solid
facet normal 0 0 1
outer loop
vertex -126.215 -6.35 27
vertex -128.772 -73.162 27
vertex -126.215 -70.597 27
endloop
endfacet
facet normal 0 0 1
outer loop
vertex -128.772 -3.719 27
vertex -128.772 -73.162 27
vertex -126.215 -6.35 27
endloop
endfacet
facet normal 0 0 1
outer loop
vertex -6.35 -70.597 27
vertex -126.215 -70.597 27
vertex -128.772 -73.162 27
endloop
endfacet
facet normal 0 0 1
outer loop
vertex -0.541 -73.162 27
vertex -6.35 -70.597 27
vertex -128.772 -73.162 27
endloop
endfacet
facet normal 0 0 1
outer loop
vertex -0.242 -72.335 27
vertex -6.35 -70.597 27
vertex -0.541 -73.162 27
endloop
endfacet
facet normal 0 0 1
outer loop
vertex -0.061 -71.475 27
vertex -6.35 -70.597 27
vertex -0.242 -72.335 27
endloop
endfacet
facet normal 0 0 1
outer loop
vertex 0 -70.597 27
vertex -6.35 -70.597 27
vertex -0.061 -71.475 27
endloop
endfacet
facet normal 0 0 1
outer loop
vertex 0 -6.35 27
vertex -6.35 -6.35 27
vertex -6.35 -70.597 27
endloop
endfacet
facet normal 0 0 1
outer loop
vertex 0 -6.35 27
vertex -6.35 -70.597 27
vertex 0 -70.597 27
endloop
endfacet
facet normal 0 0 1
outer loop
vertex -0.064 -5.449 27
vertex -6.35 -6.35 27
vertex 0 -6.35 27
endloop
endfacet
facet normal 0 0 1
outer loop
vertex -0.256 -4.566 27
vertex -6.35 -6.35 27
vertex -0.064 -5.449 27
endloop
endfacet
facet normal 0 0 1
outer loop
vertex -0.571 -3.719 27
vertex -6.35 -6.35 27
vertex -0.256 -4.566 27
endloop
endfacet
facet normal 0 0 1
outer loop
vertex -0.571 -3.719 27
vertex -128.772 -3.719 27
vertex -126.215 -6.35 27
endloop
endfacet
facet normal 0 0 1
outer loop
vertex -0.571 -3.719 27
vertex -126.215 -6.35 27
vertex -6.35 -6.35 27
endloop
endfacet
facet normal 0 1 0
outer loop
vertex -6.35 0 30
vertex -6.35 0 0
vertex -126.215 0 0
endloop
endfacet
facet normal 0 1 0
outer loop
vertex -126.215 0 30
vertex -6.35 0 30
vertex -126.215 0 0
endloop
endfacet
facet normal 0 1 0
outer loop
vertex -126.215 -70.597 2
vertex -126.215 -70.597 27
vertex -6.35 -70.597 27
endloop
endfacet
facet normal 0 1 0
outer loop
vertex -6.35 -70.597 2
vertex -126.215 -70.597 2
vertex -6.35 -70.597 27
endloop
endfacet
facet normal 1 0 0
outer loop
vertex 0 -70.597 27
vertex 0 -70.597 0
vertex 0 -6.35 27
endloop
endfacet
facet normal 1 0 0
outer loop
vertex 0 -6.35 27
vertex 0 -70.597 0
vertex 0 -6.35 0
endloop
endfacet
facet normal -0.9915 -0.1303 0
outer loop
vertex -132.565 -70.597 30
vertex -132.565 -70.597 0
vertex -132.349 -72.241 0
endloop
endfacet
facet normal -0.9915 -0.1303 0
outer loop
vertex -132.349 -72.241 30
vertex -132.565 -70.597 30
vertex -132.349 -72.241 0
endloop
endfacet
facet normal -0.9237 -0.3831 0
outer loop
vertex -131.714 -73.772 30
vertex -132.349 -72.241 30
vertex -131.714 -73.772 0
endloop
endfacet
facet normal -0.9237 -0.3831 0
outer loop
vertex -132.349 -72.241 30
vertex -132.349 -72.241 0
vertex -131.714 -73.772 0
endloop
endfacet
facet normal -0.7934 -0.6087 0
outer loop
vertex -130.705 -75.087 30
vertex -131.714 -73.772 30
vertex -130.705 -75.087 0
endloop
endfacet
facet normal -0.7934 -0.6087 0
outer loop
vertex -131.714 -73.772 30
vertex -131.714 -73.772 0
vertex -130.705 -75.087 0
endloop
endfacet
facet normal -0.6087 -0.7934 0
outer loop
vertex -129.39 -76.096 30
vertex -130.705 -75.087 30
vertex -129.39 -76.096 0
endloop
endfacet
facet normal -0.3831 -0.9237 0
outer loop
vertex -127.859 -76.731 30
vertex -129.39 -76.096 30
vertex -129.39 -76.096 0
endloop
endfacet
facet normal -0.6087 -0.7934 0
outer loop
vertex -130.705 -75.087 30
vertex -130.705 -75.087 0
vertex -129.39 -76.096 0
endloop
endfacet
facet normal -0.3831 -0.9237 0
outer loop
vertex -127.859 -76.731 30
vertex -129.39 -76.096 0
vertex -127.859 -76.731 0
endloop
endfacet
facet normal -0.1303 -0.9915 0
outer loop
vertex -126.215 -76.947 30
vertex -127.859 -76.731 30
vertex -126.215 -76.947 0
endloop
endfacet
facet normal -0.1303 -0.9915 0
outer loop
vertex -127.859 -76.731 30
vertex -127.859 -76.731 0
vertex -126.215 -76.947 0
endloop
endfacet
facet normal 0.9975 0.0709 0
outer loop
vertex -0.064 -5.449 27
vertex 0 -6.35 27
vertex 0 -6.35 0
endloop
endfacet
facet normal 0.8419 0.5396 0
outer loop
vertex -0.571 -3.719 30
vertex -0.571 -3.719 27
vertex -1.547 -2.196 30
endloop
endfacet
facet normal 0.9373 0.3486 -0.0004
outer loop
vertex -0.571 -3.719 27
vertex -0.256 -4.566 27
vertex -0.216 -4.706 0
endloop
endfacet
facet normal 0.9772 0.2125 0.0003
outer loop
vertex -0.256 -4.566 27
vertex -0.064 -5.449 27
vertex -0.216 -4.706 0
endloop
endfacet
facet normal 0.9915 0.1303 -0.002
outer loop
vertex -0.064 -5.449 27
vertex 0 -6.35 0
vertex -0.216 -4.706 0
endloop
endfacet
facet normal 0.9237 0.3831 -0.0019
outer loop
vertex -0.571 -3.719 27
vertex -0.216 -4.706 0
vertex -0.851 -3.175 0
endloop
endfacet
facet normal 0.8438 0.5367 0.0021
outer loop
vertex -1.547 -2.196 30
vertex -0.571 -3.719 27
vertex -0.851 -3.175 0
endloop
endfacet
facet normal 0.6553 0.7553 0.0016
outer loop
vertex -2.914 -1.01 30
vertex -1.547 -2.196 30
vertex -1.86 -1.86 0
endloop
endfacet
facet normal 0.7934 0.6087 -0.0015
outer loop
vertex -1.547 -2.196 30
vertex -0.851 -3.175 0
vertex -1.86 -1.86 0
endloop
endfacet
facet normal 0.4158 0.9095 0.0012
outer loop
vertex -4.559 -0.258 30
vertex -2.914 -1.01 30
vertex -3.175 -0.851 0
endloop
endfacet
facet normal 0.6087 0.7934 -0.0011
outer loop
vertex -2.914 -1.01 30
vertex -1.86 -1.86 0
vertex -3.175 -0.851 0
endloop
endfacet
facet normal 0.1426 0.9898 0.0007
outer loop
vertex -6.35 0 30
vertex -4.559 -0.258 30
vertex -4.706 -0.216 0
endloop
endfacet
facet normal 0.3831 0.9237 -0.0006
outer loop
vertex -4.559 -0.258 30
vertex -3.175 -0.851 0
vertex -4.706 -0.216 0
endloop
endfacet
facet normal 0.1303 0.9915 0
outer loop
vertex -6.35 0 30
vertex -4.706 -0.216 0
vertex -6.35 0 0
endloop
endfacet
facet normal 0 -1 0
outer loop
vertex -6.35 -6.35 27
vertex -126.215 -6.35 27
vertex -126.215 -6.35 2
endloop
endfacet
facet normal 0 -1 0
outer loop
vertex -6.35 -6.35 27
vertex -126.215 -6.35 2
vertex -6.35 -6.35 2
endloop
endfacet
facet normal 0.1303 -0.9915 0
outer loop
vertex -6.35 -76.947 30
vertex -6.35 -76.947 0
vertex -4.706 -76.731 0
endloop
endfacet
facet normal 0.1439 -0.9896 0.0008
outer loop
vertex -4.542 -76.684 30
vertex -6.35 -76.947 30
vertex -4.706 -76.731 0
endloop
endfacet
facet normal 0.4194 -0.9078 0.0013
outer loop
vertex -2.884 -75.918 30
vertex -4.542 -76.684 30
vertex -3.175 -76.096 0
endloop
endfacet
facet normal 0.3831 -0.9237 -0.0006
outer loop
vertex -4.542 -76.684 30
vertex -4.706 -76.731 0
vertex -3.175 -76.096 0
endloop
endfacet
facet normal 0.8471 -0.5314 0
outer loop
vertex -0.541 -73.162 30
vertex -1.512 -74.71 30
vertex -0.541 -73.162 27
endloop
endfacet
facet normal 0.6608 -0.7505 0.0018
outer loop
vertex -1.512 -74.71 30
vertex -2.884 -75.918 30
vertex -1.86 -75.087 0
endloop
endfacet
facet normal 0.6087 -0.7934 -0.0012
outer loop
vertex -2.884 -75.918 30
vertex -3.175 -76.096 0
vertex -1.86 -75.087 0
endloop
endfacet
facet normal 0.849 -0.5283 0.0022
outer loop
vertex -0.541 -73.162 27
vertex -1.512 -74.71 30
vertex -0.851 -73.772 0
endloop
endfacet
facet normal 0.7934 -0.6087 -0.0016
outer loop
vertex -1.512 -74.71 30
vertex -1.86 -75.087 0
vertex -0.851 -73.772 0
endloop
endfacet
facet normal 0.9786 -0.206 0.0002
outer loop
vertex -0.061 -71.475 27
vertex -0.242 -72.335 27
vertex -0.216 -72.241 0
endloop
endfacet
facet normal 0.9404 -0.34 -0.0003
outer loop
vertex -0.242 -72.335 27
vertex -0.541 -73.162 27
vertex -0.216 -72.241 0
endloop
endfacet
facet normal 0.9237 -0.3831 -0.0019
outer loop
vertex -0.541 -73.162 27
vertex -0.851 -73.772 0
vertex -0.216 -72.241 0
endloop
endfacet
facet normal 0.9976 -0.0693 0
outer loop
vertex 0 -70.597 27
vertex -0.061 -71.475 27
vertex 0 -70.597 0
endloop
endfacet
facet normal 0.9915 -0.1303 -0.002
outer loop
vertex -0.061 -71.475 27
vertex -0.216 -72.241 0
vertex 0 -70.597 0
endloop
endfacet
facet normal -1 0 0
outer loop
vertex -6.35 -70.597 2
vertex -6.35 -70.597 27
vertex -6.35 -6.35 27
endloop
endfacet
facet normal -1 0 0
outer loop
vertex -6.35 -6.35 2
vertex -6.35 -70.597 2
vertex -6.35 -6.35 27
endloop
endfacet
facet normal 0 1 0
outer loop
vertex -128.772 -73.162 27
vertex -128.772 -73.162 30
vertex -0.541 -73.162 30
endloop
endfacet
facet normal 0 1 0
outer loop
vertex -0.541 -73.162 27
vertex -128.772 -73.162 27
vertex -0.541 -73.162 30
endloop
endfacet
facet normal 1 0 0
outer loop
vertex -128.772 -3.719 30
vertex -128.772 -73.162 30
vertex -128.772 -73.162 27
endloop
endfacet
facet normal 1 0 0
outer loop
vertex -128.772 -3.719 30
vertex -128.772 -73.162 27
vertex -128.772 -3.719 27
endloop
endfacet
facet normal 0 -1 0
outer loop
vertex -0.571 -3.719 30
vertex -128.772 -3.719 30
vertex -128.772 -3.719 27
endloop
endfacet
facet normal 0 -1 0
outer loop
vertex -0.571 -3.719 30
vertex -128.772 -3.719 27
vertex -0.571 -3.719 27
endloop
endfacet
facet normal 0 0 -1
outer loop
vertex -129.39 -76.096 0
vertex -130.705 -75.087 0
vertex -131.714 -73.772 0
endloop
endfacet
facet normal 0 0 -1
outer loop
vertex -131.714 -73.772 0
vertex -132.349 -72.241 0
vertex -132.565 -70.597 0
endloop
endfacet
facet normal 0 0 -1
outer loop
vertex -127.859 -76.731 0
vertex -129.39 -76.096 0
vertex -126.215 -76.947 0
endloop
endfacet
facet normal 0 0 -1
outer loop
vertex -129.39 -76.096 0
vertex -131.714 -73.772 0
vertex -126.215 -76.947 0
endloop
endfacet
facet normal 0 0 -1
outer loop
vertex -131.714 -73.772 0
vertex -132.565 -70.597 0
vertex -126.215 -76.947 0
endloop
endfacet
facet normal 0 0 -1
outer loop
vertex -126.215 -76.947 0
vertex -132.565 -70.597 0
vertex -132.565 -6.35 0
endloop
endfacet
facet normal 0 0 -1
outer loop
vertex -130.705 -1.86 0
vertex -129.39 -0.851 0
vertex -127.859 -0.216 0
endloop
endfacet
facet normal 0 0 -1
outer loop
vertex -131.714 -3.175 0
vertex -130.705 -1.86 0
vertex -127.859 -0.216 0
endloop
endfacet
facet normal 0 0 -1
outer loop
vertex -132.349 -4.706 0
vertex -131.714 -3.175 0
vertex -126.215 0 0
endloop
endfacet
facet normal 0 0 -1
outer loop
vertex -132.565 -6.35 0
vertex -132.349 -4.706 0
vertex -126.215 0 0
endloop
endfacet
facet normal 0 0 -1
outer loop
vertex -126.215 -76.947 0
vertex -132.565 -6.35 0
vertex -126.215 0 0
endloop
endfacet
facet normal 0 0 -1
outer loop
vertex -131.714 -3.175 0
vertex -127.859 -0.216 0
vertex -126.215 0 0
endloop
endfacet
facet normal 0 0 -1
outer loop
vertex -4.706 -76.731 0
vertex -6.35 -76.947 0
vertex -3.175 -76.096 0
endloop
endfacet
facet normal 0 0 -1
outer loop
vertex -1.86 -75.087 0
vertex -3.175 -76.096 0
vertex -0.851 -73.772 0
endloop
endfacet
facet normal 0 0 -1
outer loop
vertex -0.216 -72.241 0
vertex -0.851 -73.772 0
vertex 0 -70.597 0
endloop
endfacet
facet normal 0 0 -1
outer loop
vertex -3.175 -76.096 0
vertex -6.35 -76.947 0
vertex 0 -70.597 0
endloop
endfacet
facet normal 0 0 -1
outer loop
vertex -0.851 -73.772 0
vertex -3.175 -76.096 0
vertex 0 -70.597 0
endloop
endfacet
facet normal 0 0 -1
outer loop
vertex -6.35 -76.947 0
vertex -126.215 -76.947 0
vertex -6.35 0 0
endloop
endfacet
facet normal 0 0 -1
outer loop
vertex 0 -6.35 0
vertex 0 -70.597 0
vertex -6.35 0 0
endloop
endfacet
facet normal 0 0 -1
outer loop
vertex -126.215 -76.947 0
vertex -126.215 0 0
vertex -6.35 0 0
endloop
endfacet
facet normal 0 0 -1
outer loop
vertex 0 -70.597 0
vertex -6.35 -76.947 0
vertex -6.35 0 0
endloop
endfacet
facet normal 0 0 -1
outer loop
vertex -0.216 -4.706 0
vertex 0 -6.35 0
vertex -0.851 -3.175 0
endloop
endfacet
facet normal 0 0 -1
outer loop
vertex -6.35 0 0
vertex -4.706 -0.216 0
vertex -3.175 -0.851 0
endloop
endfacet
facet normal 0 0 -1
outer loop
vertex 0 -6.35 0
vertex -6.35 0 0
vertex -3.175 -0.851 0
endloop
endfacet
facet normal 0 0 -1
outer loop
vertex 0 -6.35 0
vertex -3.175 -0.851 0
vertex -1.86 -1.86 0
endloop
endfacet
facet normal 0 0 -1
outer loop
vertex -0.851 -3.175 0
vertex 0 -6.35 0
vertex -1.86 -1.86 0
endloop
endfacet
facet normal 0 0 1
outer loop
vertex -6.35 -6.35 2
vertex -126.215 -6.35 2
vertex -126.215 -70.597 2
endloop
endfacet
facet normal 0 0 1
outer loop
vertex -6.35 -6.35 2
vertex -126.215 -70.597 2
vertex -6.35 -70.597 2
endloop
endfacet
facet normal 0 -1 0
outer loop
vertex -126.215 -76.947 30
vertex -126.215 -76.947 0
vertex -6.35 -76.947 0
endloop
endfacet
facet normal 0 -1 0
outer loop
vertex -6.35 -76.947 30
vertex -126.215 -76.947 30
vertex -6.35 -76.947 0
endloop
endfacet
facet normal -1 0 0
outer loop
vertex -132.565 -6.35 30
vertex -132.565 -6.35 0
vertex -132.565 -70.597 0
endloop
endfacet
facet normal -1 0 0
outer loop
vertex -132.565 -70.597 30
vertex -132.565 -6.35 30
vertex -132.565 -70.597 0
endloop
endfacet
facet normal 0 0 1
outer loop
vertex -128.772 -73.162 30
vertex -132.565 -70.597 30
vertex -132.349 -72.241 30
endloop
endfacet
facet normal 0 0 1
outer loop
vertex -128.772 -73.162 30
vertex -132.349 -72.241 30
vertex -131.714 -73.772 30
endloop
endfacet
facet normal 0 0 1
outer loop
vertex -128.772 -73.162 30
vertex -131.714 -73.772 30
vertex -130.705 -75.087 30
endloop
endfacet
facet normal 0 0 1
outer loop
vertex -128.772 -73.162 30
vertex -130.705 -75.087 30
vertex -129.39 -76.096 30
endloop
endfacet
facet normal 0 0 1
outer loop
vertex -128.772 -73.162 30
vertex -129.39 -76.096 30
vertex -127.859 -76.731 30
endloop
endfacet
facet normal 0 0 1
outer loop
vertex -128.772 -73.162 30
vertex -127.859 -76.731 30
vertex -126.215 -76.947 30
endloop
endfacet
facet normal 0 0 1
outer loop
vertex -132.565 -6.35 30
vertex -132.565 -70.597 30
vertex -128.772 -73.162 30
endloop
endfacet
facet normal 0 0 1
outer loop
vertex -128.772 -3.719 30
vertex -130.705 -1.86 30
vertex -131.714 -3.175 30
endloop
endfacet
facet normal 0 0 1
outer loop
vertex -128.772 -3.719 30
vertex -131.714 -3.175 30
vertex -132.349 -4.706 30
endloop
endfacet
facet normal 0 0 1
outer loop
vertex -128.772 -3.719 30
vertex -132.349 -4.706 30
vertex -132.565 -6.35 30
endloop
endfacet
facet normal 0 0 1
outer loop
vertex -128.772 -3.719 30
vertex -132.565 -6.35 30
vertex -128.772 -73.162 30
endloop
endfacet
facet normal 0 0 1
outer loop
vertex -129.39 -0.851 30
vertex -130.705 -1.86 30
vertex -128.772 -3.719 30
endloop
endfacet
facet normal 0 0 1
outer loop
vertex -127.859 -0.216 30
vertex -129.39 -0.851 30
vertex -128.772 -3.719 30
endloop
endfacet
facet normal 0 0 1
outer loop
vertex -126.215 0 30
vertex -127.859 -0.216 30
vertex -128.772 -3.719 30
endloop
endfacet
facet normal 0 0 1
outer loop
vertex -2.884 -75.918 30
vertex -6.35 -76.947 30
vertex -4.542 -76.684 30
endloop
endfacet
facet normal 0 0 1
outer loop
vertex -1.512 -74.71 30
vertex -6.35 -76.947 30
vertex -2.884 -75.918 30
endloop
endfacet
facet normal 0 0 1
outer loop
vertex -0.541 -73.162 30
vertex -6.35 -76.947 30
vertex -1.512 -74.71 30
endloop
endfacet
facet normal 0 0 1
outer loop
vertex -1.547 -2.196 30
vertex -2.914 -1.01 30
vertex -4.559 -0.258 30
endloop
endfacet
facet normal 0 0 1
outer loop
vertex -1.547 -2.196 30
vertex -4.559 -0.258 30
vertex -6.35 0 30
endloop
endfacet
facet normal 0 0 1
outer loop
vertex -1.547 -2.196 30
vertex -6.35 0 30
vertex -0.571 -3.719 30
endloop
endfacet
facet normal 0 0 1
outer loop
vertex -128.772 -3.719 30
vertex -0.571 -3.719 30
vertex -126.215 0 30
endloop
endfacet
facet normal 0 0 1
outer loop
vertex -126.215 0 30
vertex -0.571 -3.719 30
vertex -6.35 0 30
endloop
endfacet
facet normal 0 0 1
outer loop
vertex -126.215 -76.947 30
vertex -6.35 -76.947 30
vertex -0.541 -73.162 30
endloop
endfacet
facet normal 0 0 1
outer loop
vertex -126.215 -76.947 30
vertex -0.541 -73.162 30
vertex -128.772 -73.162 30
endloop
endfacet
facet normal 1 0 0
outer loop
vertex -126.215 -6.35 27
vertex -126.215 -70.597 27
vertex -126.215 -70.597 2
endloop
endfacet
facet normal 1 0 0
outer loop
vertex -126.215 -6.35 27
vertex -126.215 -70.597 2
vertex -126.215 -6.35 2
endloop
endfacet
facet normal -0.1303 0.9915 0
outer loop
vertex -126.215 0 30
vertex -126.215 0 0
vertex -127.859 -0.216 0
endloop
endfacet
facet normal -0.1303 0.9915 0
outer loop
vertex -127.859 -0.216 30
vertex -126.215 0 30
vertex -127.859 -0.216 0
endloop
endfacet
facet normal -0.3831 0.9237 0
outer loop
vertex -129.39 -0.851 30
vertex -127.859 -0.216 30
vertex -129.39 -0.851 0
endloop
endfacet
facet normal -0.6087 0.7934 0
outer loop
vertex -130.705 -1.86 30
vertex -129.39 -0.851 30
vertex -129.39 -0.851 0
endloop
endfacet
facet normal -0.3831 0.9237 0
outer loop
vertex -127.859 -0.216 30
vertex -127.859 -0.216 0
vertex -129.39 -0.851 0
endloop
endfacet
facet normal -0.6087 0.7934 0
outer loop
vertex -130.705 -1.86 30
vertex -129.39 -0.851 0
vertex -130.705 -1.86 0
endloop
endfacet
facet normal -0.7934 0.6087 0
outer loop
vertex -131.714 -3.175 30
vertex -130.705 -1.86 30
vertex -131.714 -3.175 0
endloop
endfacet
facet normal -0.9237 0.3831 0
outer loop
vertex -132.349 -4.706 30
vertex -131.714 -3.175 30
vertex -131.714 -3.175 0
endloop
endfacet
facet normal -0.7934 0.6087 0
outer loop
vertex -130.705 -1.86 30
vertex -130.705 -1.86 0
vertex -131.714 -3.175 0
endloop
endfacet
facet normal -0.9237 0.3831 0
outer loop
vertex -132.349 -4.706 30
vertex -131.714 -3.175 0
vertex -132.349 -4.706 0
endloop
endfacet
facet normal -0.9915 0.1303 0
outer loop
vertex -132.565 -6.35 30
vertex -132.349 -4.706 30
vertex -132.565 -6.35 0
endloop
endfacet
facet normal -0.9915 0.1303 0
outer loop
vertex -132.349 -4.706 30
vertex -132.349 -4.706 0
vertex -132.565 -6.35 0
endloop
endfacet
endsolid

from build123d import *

# Parameters (mm, degrees)
F1_DEPTH = 30
F2_W     = 119.865141
F2_H     = 64.247175
F3_DEPTH = 28
F4_W     = 136.580032
F4_H     = 69.443569
F5_DEPTH = 3


with BuildPart() as f1:
    # F0 (on Top) → F1 (new body)
    with BuildSketch(Plane.XY):
        with BuildLine():
            ThreePointArc((0, -6.35), (-1.859872, -1.859872), (-6.35, 0))
            Line((-6.35, 0), (-126.215141, 0))
            ThreePointArc((-126.215141, 0), (-130.705269, -1.859872), (-132.565141, -6.35))
            Line((-132.565141, -6.35), (-132.565141, -70.597175))
            ThreePointArc((-132.565141, -70.597175), (-130.705269, -75.087303), (-126.215141, -76.947175))
            Line((-126.215141, -76.947175), (-6.35, -76.947175))
            ThreePointArc((-6.35, -76.947175), (-1.859872, -75.087303), (0, -70.597175))
            Line((0, -70.597175), (0, -6.35))
        make_face()
    extrude(amount=F1_DEPTH)

    # F2 (on face) → F3 (cut)
    with BuildSketch(Plane.XY.offset(30)):
        with Locations((-66.28257, -38.473587)):
            Rectangle(F2_W, F2_H)
    extrude(amount=-F3_DEPTH, mode=Mode.SUBTRACT)

    # F4 (on face) → F5 (cut)
    with BuildSketch(Plane.XY.offset(30)):
        with Locations((-60.4819, -38.440659)):
            Rectangle(F4_W, F4_H)
    extrude(amount=-F5_DEPTH, mode=Mode.SUBTRACT)


solid = f1.part
